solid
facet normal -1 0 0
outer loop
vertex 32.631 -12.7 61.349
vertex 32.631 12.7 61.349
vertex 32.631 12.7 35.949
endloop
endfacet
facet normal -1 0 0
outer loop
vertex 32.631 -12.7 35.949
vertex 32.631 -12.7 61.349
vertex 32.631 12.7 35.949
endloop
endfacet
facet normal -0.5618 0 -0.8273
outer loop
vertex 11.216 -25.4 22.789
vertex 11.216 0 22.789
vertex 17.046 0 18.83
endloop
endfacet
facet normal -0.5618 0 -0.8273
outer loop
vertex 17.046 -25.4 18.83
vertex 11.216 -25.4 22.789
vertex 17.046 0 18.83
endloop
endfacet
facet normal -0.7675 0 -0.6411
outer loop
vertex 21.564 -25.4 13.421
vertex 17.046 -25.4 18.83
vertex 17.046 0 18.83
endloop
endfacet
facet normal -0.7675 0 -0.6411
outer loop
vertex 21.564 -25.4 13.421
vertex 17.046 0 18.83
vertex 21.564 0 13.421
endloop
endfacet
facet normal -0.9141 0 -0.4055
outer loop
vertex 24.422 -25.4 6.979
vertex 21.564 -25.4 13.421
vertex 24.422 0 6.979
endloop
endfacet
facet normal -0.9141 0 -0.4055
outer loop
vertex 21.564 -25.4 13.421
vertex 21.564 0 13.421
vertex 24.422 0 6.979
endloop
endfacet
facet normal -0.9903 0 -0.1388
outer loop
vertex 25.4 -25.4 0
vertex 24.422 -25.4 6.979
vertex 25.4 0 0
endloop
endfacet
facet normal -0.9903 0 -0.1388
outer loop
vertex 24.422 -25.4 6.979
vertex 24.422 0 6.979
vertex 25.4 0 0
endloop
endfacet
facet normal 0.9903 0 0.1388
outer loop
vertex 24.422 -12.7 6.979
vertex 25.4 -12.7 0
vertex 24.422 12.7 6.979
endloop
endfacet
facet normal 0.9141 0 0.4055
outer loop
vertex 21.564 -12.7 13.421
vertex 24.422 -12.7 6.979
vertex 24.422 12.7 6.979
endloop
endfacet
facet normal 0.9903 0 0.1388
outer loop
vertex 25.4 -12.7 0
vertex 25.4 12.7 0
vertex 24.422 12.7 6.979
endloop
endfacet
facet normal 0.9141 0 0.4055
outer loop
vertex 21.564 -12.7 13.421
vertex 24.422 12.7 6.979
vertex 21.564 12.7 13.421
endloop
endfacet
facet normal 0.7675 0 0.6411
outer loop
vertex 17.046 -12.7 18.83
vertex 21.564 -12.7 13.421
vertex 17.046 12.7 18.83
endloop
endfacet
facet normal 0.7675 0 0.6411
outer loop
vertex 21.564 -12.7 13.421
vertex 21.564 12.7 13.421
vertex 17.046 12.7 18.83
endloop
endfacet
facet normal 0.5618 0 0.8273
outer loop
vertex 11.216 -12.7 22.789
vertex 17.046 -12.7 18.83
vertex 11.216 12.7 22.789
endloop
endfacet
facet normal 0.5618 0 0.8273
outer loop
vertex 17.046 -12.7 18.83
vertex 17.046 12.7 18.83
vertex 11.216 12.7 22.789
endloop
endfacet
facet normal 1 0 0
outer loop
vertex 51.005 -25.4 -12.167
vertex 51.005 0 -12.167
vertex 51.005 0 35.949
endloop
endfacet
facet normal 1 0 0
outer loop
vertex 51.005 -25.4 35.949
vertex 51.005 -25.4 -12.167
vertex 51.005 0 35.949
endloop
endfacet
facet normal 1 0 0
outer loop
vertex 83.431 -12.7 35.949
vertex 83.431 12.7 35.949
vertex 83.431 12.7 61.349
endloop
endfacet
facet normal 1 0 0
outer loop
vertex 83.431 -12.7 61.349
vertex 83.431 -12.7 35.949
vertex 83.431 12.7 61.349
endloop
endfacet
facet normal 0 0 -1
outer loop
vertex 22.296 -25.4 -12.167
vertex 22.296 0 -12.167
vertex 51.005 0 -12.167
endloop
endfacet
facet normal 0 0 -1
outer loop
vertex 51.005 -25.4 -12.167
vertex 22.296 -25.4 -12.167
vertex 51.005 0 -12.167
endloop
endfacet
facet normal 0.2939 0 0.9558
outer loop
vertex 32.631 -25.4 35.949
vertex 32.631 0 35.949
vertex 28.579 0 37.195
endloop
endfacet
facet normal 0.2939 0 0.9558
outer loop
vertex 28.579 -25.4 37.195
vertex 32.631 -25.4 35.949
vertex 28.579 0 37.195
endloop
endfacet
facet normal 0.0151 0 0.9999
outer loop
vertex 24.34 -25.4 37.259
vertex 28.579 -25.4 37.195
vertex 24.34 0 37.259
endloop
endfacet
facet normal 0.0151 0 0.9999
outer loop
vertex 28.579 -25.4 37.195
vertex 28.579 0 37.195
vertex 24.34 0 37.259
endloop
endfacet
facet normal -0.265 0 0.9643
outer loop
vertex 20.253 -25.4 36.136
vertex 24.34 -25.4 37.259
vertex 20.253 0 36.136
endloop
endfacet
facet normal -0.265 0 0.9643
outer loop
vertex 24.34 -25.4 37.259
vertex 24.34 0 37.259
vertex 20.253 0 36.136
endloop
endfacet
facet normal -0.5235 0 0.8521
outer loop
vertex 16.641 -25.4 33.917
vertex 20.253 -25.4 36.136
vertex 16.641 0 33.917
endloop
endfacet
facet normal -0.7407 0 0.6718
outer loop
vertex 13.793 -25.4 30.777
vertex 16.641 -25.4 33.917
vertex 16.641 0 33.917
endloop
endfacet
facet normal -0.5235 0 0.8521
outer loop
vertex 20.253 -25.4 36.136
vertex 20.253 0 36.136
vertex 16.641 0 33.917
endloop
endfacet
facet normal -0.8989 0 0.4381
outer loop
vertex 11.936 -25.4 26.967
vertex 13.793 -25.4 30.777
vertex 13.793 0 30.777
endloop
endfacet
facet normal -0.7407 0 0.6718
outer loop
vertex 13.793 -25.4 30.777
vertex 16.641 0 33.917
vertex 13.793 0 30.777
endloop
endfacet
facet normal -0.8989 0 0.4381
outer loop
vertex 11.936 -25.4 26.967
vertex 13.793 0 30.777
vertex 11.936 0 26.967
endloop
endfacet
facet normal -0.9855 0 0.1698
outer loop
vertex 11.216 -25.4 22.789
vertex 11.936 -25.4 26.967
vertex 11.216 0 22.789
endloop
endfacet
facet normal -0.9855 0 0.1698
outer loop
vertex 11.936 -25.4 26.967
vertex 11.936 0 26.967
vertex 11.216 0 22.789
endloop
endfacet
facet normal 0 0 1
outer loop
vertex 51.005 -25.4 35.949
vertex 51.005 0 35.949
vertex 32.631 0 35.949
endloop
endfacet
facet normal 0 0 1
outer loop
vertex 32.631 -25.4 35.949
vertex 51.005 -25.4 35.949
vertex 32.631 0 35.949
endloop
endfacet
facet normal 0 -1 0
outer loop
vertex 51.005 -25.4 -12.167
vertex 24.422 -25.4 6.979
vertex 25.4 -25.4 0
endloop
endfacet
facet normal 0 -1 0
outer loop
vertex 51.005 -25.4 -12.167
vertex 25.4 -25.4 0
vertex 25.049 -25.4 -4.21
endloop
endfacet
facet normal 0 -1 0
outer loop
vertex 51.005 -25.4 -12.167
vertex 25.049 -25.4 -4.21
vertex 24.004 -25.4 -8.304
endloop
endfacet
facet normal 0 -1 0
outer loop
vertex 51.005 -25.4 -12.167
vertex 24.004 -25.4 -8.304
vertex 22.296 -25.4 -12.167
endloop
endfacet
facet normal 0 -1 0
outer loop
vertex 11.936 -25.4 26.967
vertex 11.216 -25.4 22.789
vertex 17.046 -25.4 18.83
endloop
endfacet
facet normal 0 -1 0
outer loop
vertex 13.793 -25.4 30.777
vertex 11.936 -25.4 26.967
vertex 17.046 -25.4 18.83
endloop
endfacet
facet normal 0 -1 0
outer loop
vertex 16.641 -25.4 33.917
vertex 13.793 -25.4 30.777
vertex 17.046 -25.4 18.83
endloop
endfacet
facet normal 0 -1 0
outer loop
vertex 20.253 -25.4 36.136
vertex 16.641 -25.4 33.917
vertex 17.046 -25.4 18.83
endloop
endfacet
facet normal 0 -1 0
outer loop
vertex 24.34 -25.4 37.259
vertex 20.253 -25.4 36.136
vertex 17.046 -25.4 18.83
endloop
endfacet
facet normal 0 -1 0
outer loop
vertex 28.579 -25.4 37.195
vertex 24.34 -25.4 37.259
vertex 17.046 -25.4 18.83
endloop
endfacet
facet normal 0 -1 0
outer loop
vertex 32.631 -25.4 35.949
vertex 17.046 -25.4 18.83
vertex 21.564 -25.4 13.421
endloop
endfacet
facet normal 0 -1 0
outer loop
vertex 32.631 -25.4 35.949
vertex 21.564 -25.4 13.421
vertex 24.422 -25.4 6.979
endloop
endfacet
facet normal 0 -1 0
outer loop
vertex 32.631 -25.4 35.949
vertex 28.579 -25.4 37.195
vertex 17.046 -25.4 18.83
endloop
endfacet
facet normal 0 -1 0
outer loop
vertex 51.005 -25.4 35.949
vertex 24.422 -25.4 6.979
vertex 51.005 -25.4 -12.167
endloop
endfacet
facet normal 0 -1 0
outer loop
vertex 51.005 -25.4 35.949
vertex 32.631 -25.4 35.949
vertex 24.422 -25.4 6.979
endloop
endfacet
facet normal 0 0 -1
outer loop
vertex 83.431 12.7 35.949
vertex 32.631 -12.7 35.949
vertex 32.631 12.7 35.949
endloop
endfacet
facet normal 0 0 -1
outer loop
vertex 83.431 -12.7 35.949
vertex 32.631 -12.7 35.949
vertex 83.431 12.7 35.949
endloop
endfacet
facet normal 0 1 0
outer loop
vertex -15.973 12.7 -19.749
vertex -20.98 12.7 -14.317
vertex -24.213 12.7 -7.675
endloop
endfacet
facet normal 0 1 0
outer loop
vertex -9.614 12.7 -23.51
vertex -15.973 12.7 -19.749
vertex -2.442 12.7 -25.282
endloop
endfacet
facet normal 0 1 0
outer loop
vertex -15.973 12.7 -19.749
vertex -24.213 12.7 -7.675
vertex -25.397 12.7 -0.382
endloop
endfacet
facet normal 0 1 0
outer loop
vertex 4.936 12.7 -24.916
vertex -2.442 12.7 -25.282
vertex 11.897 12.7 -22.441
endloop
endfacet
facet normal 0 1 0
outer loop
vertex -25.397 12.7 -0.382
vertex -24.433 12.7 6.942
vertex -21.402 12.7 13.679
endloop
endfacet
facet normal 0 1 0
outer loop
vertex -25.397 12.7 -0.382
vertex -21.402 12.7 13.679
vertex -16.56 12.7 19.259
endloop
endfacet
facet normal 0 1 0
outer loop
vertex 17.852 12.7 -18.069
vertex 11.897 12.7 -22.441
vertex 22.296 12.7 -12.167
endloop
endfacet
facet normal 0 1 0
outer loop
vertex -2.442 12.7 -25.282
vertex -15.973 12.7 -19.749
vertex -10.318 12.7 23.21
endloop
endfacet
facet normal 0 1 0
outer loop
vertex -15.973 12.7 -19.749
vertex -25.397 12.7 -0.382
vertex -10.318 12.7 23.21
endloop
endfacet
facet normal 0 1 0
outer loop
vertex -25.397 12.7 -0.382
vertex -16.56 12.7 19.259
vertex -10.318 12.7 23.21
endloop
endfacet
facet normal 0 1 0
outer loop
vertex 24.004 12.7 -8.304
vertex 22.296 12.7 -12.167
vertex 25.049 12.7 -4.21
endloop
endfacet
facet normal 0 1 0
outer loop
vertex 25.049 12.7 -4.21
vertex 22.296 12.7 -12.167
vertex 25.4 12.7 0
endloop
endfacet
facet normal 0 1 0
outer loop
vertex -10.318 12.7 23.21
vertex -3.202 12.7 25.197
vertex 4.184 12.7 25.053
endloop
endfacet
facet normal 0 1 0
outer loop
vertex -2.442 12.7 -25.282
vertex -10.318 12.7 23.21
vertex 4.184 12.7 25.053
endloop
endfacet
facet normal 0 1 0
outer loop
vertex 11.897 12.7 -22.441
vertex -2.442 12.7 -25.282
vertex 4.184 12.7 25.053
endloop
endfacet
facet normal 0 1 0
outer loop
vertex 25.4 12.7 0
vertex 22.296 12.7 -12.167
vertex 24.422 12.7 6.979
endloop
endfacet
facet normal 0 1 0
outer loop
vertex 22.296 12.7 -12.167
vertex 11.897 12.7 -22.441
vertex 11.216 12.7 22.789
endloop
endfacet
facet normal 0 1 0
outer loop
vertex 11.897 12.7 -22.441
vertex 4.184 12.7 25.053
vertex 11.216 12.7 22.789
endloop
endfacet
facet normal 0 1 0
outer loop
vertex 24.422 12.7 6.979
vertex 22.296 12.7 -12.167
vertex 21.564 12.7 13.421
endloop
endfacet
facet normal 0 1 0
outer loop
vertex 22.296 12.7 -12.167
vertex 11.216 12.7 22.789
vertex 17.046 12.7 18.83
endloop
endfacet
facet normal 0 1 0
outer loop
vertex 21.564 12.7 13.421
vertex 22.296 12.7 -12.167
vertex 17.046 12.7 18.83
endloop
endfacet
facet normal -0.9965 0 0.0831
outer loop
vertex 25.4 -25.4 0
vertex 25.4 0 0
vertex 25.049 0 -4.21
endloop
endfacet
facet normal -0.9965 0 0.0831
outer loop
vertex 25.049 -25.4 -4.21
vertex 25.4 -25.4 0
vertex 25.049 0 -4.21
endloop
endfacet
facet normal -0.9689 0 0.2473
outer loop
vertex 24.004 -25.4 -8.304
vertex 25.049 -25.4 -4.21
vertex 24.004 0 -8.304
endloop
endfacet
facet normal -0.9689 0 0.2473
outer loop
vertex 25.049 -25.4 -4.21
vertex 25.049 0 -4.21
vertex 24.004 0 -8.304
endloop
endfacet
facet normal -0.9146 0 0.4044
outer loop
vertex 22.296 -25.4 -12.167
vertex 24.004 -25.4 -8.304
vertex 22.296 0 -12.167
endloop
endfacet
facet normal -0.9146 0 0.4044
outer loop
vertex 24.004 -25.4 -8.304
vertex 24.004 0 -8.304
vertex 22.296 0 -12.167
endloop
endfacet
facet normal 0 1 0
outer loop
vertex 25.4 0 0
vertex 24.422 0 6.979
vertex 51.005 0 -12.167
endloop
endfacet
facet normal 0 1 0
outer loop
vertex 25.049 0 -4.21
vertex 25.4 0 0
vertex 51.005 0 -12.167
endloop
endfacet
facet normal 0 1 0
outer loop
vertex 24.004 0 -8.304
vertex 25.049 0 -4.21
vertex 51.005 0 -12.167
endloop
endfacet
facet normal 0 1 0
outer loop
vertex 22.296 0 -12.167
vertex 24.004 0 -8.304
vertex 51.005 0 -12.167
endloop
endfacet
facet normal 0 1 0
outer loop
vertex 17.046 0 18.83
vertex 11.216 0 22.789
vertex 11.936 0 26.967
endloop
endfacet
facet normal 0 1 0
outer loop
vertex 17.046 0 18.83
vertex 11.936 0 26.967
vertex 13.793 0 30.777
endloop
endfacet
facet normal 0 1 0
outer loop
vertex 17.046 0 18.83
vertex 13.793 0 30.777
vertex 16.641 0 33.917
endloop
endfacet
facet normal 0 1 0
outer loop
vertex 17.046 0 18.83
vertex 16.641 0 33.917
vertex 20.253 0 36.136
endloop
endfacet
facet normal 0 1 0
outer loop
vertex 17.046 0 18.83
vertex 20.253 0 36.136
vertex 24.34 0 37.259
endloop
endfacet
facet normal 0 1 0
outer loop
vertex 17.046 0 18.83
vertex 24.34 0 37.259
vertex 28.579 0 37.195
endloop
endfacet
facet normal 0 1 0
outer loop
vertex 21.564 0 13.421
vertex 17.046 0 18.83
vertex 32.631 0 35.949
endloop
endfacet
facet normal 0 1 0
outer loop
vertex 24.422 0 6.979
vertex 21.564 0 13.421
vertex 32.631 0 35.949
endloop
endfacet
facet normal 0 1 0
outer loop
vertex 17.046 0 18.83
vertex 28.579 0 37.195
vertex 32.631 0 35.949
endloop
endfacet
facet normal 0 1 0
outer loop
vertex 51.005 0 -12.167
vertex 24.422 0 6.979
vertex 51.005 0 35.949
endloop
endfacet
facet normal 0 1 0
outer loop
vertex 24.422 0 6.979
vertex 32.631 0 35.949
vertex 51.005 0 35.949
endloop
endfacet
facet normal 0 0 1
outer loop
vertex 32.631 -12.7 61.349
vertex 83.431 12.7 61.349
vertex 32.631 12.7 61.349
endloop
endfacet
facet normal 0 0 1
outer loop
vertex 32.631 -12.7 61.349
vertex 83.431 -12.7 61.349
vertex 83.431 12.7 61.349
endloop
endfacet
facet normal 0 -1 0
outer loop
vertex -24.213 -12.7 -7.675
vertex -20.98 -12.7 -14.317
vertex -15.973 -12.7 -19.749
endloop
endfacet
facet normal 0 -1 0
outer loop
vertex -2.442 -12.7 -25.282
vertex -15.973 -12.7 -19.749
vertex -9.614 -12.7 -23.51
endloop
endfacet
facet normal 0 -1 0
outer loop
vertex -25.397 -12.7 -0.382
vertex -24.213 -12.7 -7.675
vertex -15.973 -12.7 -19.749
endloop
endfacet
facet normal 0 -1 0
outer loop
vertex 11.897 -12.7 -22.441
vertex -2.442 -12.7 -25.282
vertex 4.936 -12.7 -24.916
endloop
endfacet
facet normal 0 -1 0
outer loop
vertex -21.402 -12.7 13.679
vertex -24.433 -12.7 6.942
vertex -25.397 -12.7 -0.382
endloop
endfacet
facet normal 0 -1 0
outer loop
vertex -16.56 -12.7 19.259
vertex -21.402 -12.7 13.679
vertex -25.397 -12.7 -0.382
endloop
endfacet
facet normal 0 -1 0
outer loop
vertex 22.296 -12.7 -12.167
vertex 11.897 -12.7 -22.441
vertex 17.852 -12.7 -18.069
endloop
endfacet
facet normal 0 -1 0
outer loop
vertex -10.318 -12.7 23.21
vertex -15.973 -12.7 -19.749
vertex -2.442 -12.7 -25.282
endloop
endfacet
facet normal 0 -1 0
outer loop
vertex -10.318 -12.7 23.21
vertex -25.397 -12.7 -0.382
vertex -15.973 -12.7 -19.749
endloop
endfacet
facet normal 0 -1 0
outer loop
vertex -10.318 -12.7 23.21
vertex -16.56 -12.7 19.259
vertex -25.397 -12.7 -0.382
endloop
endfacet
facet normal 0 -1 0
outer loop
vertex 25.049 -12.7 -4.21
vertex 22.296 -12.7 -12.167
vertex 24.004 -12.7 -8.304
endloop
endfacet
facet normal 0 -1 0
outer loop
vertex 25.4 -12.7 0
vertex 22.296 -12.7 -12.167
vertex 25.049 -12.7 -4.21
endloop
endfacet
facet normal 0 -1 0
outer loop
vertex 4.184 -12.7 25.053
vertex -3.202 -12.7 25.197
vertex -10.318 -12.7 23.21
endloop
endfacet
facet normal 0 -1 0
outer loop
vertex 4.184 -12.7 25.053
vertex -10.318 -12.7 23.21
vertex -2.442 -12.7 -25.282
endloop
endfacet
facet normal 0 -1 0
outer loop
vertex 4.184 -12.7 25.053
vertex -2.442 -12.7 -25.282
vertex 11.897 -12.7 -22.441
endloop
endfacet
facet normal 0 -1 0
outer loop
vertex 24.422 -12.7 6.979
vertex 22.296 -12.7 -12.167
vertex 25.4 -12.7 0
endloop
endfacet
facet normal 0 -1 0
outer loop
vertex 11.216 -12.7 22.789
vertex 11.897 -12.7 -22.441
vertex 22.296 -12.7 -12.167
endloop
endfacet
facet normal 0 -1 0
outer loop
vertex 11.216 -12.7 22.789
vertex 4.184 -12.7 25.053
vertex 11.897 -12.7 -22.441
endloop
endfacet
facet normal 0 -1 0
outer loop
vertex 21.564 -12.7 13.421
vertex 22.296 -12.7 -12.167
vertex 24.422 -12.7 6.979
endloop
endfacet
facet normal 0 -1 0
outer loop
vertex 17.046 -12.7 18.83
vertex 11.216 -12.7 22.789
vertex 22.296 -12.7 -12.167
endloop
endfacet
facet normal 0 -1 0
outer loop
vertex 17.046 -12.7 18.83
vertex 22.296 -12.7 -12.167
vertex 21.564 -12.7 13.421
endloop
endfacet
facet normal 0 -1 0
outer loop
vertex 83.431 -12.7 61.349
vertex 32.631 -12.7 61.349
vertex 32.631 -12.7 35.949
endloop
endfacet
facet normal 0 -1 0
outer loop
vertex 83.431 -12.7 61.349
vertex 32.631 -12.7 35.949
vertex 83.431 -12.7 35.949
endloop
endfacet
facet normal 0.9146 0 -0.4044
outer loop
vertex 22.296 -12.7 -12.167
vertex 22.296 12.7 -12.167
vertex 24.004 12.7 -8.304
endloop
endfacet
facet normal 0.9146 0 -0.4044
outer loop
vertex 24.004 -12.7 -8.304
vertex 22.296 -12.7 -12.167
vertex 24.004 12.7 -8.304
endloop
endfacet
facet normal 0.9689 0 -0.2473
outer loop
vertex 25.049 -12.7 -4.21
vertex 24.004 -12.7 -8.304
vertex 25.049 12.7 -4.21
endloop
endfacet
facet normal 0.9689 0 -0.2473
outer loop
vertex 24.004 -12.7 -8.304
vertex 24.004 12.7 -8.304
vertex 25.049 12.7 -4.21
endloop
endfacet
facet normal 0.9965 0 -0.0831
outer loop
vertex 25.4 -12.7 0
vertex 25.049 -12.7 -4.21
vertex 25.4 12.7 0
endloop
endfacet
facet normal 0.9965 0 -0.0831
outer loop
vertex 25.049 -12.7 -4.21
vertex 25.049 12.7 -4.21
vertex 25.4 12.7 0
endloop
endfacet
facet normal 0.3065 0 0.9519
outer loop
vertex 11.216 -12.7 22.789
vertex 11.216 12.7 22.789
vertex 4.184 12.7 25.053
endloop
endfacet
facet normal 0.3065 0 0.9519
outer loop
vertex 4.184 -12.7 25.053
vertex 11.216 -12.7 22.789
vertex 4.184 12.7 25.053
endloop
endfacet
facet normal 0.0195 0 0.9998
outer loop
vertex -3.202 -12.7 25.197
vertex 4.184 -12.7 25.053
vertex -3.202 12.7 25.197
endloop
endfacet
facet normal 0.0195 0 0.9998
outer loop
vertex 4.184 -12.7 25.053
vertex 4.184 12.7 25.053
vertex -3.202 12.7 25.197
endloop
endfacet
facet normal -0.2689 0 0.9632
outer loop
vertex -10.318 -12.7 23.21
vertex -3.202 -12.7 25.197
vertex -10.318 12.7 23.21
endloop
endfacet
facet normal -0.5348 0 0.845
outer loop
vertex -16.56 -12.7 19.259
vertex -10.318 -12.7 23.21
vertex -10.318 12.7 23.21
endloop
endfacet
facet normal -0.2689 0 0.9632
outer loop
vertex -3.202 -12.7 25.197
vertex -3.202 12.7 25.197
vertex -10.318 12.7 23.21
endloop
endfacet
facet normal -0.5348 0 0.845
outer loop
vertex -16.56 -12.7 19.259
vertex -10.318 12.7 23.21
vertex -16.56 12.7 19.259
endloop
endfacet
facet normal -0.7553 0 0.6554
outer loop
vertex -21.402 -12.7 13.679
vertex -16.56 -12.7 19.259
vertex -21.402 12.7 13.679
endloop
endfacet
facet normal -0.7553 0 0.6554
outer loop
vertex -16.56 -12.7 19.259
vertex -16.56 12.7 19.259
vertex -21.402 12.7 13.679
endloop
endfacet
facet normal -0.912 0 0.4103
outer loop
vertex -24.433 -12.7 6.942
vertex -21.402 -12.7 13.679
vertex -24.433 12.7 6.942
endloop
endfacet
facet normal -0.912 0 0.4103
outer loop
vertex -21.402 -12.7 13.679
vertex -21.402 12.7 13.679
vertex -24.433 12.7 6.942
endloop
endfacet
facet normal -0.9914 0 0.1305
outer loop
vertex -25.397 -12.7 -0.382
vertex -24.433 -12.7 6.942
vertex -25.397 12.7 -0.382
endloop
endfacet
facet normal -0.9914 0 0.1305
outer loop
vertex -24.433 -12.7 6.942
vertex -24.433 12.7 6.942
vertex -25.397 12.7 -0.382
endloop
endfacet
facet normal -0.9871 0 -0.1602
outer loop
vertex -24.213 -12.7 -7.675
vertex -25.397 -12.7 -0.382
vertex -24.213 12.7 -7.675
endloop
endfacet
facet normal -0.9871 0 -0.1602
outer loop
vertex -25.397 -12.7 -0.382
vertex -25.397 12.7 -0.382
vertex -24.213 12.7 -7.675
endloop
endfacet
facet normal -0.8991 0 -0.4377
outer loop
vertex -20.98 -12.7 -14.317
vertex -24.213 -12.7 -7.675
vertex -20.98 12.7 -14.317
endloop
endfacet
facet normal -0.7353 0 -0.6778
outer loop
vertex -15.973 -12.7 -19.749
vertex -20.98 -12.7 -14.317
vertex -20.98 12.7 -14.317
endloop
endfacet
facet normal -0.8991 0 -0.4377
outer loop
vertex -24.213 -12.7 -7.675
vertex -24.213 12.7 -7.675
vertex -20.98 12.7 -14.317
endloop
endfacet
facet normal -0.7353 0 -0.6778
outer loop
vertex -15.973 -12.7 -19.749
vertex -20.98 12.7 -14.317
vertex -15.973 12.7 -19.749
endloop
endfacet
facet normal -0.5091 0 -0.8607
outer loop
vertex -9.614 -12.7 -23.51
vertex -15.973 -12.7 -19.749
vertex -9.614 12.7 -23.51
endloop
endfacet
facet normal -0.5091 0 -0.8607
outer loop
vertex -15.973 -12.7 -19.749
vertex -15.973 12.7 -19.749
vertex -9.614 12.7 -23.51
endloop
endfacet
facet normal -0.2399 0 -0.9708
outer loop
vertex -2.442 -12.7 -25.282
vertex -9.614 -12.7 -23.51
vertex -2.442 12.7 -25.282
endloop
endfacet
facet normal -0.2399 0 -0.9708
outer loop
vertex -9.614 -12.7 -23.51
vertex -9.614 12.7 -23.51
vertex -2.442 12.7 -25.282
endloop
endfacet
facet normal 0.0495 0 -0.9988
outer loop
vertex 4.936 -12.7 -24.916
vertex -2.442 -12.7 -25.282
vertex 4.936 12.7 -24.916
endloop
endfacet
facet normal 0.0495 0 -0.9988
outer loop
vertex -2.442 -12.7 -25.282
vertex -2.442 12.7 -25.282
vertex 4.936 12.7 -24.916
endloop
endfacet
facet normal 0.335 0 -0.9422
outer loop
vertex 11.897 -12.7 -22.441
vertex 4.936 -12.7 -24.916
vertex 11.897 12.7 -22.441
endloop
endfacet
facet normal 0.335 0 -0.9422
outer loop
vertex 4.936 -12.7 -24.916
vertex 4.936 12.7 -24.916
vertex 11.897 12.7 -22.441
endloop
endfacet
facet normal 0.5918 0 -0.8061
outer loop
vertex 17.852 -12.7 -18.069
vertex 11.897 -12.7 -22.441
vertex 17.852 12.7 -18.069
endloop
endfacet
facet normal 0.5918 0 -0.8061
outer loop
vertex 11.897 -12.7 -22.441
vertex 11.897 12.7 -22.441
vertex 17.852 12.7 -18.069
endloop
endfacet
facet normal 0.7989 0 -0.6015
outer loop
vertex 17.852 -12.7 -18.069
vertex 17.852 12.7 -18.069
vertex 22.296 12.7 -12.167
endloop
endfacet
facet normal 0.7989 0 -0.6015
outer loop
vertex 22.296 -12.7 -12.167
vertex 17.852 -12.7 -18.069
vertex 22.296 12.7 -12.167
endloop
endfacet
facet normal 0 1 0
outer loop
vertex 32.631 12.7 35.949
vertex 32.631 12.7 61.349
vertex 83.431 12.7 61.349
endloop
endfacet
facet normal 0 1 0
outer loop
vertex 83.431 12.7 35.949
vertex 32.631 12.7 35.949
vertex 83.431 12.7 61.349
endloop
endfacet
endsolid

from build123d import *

# Parameters (mm, degrees)
F1_DEPTH = 12.7
F2_DEPTH = 25.4


with BuildPart() as f1:
    # F0 (on Front) → F1 (new body, symmetric)
    with BuildSketch(Plane.XZ):
        with BuildLine():
            ThreePointArc((22.296051, -12.167419), (24.611783, -6.278547), (25.4, 0))
            ThreePointArc((25.4, 0), (21.564414, 13.421477), (11.21606, 22.789471))
            ThreePointArc((11.21606, 22.789471), (-24.212837, -7.674539), (22.296051, -12.167419))
        make_face()
        Polygon((32.630809, 61.349193), (32.630809, 35.949193), (51.004838, 35.949193), (83.430809, 35.949193), (83.430809, 61.349193), align=None)
    extrude(amount=F1_DEPTH, both=True)


with BuildPart() as f2:
    # F0 (on Front) → F2 (new body)
    with BuildSketch(Plane.XZ):
        with BuildLine():
            ThreePointArc((11.21606, 22.789471), (21.564414, 13.421477), (25.4, 0))
            ThreePointArc((25.4, 0), (24.611783, -6.278547), (22.296051, -12.167419))
            Line((22.296051, -12.167419), (51.004838, -12.167419))
            Line((51.004838, -12.167419), (51.004838, 35.949193))
            Line((51.004838, 35.949193), (32.630809, 35.949193))
            ThreePointArc((32.630809, 35.949193), (18.368267, 35.154638), (11.21606, 22.789471))
        make_face()
    extrude(amount=F2_DEPTH)


solid = Compound([f1.part, f2.part])
